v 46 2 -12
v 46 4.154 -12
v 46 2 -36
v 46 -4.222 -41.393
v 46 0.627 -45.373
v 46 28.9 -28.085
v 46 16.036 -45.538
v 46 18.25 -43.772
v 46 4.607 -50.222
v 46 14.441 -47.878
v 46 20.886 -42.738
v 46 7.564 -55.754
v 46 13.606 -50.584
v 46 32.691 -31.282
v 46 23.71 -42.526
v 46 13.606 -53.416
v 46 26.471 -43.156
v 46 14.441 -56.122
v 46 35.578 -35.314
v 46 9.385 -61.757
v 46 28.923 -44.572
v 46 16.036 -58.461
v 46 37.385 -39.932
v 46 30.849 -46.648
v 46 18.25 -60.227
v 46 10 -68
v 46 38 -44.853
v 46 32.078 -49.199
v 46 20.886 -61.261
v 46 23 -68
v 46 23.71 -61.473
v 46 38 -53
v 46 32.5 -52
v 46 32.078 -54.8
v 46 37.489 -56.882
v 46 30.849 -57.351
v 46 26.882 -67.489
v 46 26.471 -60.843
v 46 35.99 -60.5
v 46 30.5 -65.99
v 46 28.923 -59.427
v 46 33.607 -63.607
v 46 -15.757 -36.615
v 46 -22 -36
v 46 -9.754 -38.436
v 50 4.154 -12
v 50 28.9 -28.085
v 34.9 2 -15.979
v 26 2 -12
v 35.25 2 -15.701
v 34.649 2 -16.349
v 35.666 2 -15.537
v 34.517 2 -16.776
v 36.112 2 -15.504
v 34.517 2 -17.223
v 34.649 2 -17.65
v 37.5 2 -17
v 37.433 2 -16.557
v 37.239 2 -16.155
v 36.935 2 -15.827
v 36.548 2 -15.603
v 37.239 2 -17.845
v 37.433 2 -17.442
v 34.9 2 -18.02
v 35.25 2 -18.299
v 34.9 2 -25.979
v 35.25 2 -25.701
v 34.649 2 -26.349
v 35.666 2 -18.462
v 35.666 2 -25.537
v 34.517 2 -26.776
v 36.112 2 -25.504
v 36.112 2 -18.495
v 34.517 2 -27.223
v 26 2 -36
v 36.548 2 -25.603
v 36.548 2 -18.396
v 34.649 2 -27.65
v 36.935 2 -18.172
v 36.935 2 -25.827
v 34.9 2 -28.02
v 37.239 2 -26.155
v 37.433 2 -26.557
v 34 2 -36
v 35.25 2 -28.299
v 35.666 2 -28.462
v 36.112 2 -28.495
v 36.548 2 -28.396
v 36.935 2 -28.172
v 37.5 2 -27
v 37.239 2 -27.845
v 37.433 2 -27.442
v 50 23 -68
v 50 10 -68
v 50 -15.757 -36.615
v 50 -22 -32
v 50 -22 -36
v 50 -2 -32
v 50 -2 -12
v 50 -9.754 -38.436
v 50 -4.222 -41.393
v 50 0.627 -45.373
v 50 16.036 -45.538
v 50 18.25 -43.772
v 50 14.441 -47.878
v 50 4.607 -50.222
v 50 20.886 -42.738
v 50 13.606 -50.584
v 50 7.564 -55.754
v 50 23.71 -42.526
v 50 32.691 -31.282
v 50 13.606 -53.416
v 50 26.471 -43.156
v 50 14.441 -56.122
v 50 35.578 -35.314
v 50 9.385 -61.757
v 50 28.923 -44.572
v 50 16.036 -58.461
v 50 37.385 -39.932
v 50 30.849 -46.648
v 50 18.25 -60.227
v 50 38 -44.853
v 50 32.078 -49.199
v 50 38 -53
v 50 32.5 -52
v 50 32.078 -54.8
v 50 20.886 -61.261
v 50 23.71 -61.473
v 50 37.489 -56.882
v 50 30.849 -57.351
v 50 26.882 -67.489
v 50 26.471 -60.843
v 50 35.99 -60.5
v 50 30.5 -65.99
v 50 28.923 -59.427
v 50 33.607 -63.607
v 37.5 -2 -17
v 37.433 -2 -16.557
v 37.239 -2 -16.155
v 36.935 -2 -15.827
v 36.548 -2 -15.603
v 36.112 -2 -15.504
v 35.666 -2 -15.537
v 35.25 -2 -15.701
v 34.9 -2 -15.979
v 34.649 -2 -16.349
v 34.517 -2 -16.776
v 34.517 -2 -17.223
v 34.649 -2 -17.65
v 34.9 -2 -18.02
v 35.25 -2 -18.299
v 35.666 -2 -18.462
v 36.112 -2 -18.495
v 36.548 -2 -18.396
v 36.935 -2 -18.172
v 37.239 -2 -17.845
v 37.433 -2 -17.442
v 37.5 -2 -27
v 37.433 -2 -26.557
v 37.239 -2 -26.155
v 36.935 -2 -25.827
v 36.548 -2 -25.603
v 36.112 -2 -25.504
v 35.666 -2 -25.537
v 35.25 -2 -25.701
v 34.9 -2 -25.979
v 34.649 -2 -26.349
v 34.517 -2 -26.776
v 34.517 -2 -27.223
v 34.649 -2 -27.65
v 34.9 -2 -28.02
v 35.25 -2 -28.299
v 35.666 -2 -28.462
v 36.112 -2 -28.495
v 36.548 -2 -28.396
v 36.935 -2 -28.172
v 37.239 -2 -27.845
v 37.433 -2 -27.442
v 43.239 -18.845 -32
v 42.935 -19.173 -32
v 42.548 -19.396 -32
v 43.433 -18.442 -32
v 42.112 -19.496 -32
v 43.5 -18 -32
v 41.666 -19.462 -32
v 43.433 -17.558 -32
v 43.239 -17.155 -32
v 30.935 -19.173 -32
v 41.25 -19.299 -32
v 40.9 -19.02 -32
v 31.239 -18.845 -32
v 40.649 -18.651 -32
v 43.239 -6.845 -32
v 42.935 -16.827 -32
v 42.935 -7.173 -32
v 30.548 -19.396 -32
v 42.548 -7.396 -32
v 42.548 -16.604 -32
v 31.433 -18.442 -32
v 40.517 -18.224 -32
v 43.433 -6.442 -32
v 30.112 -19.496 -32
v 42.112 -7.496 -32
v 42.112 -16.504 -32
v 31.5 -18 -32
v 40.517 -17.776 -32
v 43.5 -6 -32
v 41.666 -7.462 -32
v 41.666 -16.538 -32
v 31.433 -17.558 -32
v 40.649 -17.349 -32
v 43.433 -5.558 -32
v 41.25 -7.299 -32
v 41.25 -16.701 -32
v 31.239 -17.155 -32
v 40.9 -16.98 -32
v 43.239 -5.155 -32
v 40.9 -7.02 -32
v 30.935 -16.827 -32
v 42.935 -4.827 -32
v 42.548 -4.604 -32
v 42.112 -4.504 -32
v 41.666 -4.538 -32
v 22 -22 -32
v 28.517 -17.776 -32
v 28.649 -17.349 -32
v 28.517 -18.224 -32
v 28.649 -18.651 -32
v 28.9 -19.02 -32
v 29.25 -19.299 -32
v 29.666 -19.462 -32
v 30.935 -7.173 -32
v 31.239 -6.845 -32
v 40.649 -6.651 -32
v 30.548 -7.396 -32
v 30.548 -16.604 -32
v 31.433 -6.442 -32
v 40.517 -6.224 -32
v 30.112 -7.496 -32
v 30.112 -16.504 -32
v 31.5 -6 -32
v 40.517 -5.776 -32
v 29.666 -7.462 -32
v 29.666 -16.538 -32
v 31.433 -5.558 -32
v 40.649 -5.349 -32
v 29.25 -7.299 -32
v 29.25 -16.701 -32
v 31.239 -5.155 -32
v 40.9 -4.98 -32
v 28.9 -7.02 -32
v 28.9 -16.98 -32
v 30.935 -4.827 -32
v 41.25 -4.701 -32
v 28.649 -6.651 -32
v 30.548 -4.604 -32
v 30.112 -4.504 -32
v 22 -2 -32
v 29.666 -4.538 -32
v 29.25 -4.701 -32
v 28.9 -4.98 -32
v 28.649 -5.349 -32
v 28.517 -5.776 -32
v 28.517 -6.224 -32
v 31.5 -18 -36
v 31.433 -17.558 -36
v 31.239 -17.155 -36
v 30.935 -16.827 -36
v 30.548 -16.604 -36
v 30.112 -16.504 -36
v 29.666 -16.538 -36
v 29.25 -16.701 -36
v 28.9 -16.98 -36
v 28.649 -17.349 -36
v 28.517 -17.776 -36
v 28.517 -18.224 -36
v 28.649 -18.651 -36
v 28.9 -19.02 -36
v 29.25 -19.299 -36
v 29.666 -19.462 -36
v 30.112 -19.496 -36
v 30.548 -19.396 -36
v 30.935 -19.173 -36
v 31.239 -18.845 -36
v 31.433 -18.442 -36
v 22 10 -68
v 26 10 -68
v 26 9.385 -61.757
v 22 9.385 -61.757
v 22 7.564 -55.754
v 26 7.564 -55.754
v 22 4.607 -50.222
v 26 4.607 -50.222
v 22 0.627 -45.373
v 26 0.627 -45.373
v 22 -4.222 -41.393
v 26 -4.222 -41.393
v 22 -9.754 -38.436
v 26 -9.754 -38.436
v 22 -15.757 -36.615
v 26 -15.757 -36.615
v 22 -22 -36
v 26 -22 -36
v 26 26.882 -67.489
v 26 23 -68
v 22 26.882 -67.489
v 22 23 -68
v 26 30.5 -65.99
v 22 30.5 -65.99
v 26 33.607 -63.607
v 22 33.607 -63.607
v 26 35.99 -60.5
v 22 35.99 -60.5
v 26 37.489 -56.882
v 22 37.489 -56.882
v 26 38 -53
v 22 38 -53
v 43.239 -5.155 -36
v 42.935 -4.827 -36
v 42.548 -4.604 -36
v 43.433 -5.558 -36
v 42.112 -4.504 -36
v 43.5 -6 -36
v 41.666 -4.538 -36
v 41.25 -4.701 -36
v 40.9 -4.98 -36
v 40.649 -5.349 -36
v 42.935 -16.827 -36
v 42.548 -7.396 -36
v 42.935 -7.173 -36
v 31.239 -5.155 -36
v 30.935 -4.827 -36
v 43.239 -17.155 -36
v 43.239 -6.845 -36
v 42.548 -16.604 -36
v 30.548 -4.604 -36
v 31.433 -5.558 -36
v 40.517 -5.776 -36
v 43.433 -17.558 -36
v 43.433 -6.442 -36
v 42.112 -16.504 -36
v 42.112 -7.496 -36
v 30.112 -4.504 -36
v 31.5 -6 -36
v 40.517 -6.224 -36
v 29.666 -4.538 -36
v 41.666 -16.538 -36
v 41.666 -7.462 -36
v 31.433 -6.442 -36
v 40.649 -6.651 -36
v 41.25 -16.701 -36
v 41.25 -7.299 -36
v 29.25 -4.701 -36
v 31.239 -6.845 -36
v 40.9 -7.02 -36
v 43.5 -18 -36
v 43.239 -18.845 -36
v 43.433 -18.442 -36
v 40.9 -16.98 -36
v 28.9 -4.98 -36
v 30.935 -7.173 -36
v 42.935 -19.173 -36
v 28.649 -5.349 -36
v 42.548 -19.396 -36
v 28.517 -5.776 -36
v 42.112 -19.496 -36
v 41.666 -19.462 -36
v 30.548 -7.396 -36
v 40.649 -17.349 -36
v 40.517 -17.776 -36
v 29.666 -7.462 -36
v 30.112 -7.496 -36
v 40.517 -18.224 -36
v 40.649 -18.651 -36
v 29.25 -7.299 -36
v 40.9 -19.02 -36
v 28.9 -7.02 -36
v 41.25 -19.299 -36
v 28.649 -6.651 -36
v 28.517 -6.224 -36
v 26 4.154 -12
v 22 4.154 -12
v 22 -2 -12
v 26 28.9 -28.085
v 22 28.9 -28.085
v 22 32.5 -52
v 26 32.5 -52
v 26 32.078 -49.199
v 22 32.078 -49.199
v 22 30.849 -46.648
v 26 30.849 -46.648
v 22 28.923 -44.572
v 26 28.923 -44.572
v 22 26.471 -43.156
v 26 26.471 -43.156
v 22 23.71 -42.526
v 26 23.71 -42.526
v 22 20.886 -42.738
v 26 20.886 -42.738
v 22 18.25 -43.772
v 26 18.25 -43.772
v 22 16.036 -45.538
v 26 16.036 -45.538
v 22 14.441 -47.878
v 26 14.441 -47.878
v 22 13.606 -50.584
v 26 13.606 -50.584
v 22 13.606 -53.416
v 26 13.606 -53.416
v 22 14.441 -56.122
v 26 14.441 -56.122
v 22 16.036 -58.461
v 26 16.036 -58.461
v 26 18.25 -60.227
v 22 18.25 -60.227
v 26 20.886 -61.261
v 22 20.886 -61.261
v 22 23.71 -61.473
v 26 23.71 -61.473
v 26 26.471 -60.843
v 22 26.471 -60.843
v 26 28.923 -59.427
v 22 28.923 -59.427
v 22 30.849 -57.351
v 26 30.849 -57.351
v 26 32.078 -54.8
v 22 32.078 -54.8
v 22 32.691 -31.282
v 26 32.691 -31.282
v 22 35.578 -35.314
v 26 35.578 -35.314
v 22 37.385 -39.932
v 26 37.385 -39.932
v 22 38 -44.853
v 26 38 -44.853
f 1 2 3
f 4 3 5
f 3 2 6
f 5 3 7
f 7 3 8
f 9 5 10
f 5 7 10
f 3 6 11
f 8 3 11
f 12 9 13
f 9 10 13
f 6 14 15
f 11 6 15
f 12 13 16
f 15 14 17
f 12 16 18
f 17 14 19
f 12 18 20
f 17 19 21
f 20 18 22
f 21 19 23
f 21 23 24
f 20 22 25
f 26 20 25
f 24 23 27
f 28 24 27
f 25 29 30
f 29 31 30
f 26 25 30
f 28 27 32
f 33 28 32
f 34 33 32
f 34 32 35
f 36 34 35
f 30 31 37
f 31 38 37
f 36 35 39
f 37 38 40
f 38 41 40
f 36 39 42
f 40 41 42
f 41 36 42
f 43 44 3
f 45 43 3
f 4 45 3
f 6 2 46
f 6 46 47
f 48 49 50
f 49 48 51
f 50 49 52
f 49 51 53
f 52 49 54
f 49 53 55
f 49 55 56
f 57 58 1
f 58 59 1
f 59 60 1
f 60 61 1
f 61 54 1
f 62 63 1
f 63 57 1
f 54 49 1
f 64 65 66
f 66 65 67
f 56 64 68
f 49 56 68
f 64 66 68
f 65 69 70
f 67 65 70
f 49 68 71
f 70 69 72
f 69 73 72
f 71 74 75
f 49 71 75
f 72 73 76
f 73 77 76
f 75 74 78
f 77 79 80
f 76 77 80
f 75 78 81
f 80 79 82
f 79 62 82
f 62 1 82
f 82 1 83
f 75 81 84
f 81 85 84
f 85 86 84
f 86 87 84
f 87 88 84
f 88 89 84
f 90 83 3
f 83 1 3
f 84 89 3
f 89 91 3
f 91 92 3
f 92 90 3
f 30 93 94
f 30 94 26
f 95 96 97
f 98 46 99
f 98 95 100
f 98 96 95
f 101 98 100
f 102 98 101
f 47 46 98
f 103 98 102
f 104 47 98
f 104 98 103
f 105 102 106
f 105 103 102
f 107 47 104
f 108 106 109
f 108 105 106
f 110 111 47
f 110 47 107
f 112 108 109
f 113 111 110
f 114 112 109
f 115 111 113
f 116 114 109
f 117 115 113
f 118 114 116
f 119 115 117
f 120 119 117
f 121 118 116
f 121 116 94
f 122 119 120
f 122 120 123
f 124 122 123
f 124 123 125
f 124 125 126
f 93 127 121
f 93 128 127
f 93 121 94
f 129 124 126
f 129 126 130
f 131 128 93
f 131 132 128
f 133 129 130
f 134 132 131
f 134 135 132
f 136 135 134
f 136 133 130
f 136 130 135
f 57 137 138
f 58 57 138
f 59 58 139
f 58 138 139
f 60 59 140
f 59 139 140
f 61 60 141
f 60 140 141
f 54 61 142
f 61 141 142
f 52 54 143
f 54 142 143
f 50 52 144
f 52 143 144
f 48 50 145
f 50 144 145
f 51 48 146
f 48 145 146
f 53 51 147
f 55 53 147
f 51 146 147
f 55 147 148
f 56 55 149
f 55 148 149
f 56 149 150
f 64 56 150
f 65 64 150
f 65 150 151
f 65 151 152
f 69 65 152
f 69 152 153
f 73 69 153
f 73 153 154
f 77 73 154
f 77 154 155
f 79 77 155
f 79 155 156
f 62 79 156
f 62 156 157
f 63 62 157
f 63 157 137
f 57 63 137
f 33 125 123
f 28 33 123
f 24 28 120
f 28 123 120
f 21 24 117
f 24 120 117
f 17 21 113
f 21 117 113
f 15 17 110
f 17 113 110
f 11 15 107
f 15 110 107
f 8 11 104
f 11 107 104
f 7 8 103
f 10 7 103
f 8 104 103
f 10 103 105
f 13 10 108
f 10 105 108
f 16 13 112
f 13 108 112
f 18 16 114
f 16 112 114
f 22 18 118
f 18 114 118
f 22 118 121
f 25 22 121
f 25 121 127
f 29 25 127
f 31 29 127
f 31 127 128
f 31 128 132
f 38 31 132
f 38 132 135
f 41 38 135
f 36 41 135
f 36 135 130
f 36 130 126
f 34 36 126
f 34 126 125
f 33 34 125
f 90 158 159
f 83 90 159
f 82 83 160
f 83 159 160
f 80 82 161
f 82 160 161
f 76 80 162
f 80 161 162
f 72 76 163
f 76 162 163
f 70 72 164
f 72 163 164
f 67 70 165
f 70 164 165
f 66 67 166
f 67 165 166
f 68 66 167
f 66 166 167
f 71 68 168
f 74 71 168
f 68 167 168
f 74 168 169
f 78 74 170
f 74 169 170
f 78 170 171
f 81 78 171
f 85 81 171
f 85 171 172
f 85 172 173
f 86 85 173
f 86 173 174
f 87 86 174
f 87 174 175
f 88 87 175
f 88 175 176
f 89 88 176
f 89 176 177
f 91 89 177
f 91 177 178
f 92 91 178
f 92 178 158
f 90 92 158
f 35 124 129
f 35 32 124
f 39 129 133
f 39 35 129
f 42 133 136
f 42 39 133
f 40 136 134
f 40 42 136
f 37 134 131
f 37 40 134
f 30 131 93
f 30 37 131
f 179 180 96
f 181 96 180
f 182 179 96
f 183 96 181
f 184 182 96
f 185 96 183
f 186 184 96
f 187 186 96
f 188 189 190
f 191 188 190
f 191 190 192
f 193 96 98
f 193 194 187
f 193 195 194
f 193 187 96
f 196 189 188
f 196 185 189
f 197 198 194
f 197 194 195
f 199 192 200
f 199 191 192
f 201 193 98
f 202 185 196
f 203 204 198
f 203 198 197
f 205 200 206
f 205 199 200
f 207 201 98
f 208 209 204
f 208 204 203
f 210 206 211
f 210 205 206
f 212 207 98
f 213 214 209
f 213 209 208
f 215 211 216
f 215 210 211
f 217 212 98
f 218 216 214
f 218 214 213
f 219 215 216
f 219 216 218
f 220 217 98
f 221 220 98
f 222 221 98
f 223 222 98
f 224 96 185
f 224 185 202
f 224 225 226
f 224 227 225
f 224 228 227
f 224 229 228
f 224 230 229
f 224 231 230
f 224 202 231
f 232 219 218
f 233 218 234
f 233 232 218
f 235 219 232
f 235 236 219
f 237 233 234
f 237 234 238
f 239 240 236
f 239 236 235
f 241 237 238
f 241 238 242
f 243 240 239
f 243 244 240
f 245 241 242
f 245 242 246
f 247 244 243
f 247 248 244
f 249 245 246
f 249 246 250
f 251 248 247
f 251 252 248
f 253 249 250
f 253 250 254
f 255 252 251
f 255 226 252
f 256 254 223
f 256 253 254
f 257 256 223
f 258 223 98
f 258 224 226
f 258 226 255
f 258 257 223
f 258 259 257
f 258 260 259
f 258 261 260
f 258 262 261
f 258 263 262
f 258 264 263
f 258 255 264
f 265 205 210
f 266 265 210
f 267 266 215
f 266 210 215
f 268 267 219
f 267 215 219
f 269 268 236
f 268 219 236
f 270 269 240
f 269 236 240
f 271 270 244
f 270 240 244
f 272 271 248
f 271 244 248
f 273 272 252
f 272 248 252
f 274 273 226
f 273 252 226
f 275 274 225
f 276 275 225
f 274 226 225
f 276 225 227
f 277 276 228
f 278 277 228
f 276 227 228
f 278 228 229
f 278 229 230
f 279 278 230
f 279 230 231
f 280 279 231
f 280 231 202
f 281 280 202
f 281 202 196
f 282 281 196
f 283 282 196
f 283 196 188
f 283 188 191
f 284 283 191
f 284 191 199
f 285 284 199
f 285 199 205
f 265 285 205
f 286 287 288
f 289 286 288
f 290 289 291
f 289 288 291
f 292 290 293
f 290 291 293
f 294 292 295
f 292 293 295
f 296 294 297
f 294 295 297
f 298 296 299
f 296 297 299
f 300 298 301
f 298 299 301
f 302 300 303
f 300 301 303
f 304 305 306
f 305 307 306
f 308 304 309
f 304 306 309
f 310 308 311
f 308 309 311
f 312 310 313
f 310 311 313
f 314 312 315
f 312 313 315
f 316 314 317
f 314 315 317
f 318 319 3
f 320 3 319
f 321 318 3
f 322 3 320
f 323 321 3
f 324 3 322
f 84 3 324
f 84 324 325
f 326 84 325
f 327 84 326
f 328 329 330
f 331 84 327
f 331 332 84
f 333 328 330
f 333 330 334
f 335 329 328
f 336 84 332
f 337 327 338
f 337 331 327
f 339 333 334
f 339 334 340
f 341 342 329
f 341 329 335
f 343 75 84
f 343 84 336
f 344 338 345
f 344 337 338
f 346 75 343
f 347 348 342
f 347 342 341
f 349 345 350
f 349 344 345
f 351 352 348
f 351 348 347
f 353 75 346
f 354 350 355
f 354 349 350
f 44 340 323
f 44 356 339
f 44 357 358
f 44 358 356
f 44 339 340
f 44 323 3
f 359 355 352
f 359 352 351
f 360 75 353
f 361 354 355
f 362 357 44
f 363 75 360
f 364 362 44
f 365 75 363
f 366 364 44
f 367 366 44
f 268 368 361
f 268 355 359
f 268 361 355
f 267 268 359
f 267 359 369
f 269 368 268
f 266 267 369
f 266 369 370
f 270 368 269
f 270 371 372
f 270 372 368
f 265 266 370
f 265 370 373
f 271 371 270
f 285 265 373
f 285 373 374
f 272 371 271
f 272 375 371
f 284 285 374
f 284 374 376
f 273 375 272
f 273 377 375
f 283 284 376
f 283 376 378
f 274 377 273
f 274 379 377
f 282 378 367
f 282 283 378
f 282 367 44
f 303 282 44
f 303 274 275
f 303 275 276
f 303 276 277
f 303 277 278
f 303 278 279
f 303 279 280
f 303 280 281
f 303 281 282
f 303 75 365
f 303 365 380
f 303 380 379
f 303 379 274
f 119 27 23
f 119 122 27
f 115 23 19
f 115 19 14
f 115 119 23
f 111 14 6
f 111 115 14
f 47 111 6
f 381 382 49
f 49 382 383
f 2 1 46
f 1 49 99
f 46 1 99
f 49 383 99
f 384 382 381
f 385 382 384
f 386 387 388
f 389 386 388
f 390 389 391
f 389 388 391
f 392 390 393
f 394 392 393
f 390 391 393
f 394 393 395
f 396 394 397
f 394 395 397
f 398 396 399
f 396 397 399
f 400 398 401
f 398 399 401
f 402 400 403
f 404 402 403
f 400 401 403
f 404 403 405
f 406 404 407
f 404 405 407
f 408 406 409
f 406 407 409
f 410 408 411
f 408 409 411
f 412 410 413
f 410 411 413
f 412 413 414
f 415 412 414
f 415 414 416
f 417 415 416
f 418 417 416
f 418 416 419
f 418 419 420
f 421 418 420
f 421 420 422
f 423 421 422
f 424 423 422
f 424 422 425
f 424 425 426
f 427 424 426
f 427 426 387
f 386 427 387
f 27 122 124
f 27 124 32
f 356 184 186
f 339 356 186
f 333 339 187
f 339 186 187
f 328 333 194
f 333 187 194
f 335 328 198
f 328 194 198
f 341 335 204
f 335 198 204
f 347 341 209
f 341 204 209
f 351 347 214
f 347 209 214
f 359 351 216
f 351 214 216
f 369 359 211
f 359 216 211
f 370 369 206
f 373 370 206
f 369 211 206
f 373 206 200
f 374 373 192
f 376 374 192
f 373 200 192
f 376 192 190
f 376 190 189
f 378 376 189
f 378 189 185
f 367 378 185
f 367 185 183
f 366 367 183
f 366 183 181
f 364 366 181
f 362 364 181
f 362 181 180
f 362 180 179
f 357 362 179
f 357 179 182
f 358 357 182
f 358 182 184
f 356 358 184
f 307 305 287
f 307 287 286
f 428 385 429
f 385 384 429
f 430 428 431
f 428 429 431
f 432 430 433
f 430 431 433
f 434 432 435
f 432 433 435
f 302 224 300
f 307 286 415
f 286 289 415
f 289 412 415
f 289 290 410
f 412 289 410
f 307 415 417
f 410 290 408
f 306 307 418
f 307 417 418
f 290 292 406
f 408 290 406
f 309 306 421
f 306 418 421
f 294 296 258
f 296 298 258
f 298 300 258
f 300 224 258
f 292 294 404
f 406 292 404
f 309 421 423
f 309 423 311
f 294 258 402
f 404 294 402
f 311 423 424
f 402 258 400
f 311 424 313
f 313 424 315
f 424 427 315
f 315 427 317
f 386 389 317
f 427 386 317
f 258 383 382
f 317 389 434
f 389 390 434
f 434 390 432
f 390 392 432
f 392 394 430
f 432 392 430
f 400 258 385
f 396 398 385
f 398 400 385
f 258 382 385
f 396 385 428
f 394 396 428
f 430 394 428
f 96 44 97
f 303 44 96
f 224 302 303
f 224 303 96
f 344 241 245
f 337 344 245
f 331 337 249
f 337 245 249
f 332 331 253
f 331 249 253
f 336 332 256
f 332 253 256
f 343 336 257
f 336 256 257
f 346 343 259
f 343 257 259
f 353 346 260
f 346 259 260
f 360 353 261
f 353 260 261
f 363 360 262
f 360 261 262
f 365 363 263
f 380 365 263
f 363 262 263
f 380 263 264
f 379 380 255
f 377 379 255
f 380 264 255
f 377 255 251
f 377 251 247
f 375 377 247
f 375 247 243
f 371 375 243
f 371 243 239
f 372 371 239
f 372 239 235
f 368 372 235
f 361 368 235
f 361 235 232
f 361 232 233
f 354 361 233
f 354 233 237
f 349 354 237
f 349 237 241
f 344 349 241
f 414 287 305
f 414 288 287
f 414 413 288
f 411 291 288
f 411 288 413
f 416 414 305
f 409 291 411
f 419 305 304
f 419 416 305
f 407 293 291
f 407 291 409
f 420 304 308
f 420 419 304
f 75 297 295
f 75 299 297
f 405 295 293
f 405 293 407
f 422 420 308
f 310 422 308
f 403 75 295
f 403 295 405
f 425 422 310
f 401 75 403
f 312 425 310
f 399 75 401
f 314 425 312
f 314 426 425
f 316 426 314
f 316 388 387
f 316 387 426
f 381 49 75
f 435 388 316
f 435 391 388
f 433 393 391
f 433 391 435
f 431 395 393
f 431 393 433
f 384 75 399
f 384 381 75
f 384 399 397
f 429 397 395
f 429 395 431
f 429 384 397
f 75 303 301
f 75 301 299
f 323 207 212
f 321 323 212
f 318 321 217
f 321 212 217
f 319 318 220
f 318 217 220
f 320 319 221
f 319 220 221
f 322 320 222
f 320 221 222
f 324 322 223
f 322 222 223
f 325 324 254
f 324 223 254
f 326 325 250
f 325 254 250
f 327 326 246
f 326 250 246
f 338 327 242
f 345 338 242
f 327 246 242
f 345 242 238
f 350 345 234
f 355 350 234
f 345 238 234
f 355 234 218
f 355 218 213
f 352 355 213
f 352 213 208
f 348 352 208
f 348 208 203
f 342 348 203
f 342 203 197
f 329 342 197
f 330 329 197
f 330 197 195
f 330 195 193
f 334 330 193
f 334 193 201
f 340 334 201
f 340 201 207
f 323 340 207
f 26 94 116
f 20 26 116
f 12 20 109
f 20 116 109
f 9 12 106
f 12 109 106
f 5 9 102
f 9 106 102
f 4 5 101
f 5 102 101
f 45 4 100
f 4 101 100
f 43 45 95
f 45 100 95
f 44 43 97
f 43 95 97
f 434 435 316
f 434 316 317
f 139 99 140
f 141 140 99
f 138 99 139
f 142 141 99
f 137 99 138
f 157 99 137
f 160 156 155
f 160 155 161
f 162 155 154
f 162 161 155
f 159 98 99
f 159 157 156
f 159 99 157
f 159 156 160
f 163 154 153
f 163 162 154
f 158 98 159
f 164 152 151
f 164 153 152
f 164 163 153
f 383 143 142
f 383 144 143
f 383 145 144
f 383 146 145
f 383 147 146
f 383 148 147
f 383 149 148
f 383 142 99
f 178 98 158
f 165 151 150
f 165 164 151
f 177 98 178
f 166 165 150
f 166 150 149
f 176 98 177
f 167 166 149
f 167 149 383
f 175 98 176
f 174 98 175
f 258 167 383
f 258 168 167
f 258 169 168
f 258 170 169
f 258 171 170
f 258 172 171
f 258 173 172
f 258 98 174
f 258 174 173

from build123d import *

# Parameters (mm, degrees)
EXTRUDE_1_DEPTH      = 40
SKETCH_2_R           = 9.5
CUT_EXTRUDE_1_DEPTH  = 59.685603004
FILLET_1_R           = 10
SKETCH_5_R           = 1.5
CUT_EXTRUDE_4_DEPTH  = 59.685603004
CUT_EXTRUDE_START    = -1.5
SKETCH_6_R           = 10.5
SKETCH_6_R_2         = 9.5
CUT_EXTRUDE_5_DEPTH  = 1.5
SKETCH_7_W           = 51.462210428
SKETCH_7_H           = 48.175392078
CUT_EXTRUDE_6_DEPTH  = 47
FILLET_2_R           = 10
SKETCH_11_R          = 11.25
SKETCH_11_R_2        = 10.5
EXTRUDE_3_DEPTH      = 1.5
SKETCH_12_R          = 11.25
SKETCH_12_R_2        = 10.5
EXTRUDE_4_DEPTH      = 0.7
SKETCH_13_R          = 10.5
SKETCH_13_R_2        = 9.5
CUT_EXTRUDE_8_DEPTH  = 1
SKETCH_15_R          = 10.5
SKETCH_15_R_2        = 9.5
EXTRUDE_5_DEPTH      = 0.5
SKETCH_17_W          = 12
SKETCH_17_H          = 36.000381057
EXTRUDE_6_DEPTH      = 2
SKETCH_18_W          = 20
SKETCH_18_H          = 36.000381057
CUT_EXTRUDE_9_DEPTH  = 2
SKETCH_19_R          = 1.5
EXTRUDE_7_DEPTH      = 4
EXTRUDE_START        = -4
SKETCH_20_R          = 1.5
EXTRUDE_8_DEPTH      = 4
EXTRUDE_9_DEPTH      = 44
SKETCH_22_W          = 64.499046495
SKETCH_22_H          = 49.763793388
CUT_EXTRUDE_10_DEPTH = 38
SKETCH_23_W          = 12
SKETCH_23_H          = 34.000142893
CUT_EXTRUDE_12_DEPTH = 38
SKETCH_24_W          = 23.945420323
SKETCH_24_H          = 48.426166837
CUT_EXTRUDE_13_DEPTH = 4
SKETCH_25_W          = 20
SKETCH_25_H          = 40
CUT_EXTRUDE_14_DEPTH = 4
EXTRUDE_10_DEPTH     = 4
EXTRUDE_11_DEPTH     = 4
SKETCH_30_R          = 10.5
SKETCH_30_R_2        = 7.5
EXTRUDE_12_DEPTH     = 4
SKETCH_31_R          = 10.5
SKETCH_31_R_2        = 9.5
EXTRUDE_13_DEPTH     = 1
SKETCH_32_R          = 8.25
SKETCH_32_R_2        = 7.5
CUT_EXTRUDE_15_DEPTH = 0.8
SKETCH_34_W          = 20
SKETCH_34_H          = 4
EXTRUDE_14_DEPTH     = 20
SKETCH_37_R          = 9.5
CUT_EXTRUDE_19_DEPTH = 10
SKETCH_38_R          = 10.5
CUT_EXTRUDE_20_DEPTH = 1
SKETCH_39_W          = 4
SKETCH_39_H          = 36
EXTRUDE_15_DEPTH     = 22
SKETCH_40_R          = 9.5
CUT_EXTRUDE_21_DEPTH = 22
SKETCH_41_R          = 9.5
EXTRUDE_16_DEPTH     = 4
SKETCH_44_R          = 10.5
EXTRUDE_17_DEPTH     = 4
EXTRUDE_START_2      = 8
SKETCH_45_R          = 9.5
EXTRUDE_18_DEPTH     = 8
CUT_EXTRUDE_22_DEPTH = 8
SKETCH_50_W          = 4
SKETCH_50_H          = 36
EXTRUDE_19_DEPTH     = 2
EXTRUDE_20_DEPTH     = 4
EXTRUDE_21_DEPTH     = 4
SKETCH_55_R          = 1.5
CUT_EXTRUDE_23_DEPTH = 30
CUT_EXTRUDE_24_DEPTH = 30
FILLET_4_R           = 20
SKETCH_58_W          = 28
SKETCH_58_H          = 20
CUT_EXTRUDE_25_DEPTH = 10
SKETCH_59_W          = 28
SKETCH_59_H          = 4
CUT_EXTRUDE_26_DEPTH = 10
SKETCH_60_R          = 1.5
CUT_EXTRUDE_27_DEPTH = 10
SKETCH_61_R          = 9.5
EXTRUDE_22_DEPTH     = 4
SKETCH_62_R          = 9.5
EXTRUDE_23_DEPTH     = 4
SKETCH_64_W          = 4
SKETCH_64_H          = 36
EXTRUDE_24_DEPTH     = 8
SKETCH_65_R          = 32
CUT_EXTRUDE_28_DEPTH = 39
SKETCH_66_R          = 9.5
CUT_EXTRUDE_29_DEPTH = 41
FILLET_5_R           = 15


with BuildPart() as part:
    # 草图1 → 凸台-拉伸1 (new, symmetric)
    with BuildSketch(Plane.XY):
        Polygon((30, -4), (30, 38), (34, 38), (34, 0), (46, 0), (46, 38), (50, 38), (50, -4), align=None)
    extrude(amount=EXTRUDE_1_DEPTH, both=True)

    # 草图2 → 切除-拉伸1 (cut, through all)
    with BuildSketch(Plane(origin=(50, 0, 0), x_dir=(0, 0, -1), z_dir=(1, 0, 0))):
        with Locations(Location((22, 22, 0), (0, 0, 90))):
            Circle(SKETCH_2_R)
        with Locations(Location((-22, 22, 0), (0, 0, 270))):
            Circle(SKETCH_2_R)
    extrude(amount=-CUT_EXTRUDE_1_DEPTH, mode=Mode.SUBTRACT)

    # 圆角1
    fillet_1_edges = [part.edges().sort_by_distance(p)[0] for p in [
        (32, 38, -40),
        (48, 38, 40),
        (32, 38, 40),
        (48, 38, -40),
    ]]
    fillet(fillet_1_edges, radius=FILLET_1_R)

    # 草图5 → 切除-拉伸4 (cut, through all)
    with BuildSketch(Plane(origin=(50, 0, 0), x_dir=(0, 0, -1), z_dir=(1, 0, 0))):
        with Locations(Location((34.990381057, 29.5, 0), (0, 0, 90))):
            Circle(SKETCH_5_R)
        with Locations(Location((22, 7, 0), (0, 0, 90))):
            Circle(SKETCH_5_R)
        with Locations(Location((9.009618943, 29.5, 0), (0, 0, 90))):
            Circle(SKETCH_5_R)
        with Locations(Location((-34.990381057, 29.5, 0), (0, 0, 270))):
            Circle(SKETCH_5_R)
        with Locations(Location((-22, 7, 0), (0, 0, 270))):
            Circle(SKETCH_5_R)
        with Locations(Location((-9.009618943, 29.5, 0), (0, 0, 270))):
            Circle(SKETCH_5_R)
    extrude(amount=-CUT_EXTRUDE_4_DEPTH, mode=Mode.SUBTRACT)

    # 草图6 → 切除-拉伸5 (cut)
    # profile 1 of 2: a face of its own
    with BuildSketch(Plane.ZY.offset(-30).offset(CUT_EXTRUDE_START)):
        with Locations((-22, 22)):
            Circle(SKETCH_6_R)
        with Locations((-22, 22)):
            Circle(SKETCH_6_R_2, mode=Mode.SUBTRACT)
    # profile 2 of 2: a face of its own
    with BuildSketch(Plane.ZY.offset(-30).offset(CUT_EXTRUDE_START)):
        with Locations((22, 22)):
            Circle(SKETCH_6_R)
        with Locations((22, 22)):
            Circle(SKETCH_6_R_2, mode=Mode.SUBTRACT)
    extrude(amount=CUT_EXTRUDE_5_DEPTH, mode=Mode.SUBTRACT)

    # 草图7 → 切除-拉伸6 (cut)
    with BuildSketch(Plane(origin=(50, 0, 0), x_dir=(0, 0, -1), z_dir=(1, 0, 0))):
        with Locations((-21.731486271, 13.912303961)):
            Rectangle(SKETCH_7_W, SKETCH_7_H)
    extrude(amount=-CUT_EXTRUDE_6_DEPTH, mode=Mode.SUBTRACT)

    # 圆角2
    fillet_2_edges = [part.edges().sort_by_distance(p)[0] for p in [
        (32, 38, -3.999618943),
        (48, 38, -3.999618943),
    ]]
    fillet(fillet_2_edges, radius=FILLET_2_R)

    # 草图11 → 凸台-拉伸3 (add)
    with BuildSketch(Plane.ZY.offset(-31.5)):
        with Locations((-22, 22)):
            Circle(SKETCH_11_R)
        with Locations((-22, 22)):
            Circle(SKETCH_11_R_2, mode=Mode.SUBTRACT)
    extrude(amount=EXTRUDE_3_DEPTH)

    # 草图12 → 凸台-拉伸4 (add)
    with BuildSketch(Plane.ZY.offset(-31.5)):
        with Locations((-22, 22)):
            Circle(SKETCH_12_R)
        with Locations((-22, 22)):
            Circle(SKETCH_12_R_2, mode=Mode.SUBTRACT)
    extrude(amount=EXTRUDE_4_DEPTH)

    # 草图13 → 切除-拉伸8 (cut)
    with BuildSketch(Plane(origin=(50, 0, 0), x_dir=(0, 0, -1), z_dir=(1, 0, 0))):
        with Locations(Location((22, 22, 0), (0, 0, 180))):
            Circle(SKETCH_13_R)
        with Locations(Location((22, 22, 0), (0, 0, 90))):
            Circle(SKETCH_13_R_2, mode=Mode.SUBTRACT)
    extrude(amount=-CUT_EXTRUDE_8_DEPTH, mode=Mode.SUBTRACT)

    # 草图15 → 凸台-拉伸5 (add)
    with BuildSketch(Plane.ZY.offset(-31.5)):
        with Locations((-22, 22)):
            Circle(SKETCH_15_R)
        with Locations(Location((-22, 22, 0), (0, 0, 90))):
            Circle(SKETCH_15_R_2, mode=Mode.SUBTRACT)
    extrude(amount=EXTRUDE_5_DEPTH)

    # 草图17 → 凸台-拉伸6 (add)
    with BuildSketch(Plane(origin=(0, 0, 0), x_dir=(1, 0, 0), z_dir=(0, 1, 0))):
        with Locations((40, 21.999809472)):
            Rectangle(SKETCH_17_W, SKETCH_17_H)
    extrude(amount=EXTRUDE_6_DEPTH)

    # 草图18 → 切除-拉伸9 (cut)
    with BuildSketch(Plane.XZ.offset(4)):
        with Locations((40, -21.999809472)):
            Rectangle(SKETCH_18_W, SKETCH_18_H)
    extrude(amount=-CUT_EXTRUDE_9_DEPTH, mode=Mode.SUBTRACT)

    # 草图19 → 凸台-拉伸7 (add)
    with BuildSketch(Plane(origin=(50, 0, 0), x_dir=(0, 0, -1), z_dir=(1, 0, 0))):
        with Locations(Location((34.990381057, 29.5, 0), (0, 0, 90))):
            Circle(SKETCH_19_R)
        with Locations(Location((9.009618943, 29.5, 0), (0, 0, 90))):
            Circle(SKETCH_19_R)
        with Locations(Location((22, 7, 0), (0, 0, 90))):
            Circle(SKETCH_19_R)
    extrude(amount=-EXTRUDE_7_DEPTH)

    # 草图20 → 凸台-拉伸8 (add)
    with BuildSketch(Plane.ZY.offset(-30).offset(EXTRUDE_START)):
        with Locations((-9.009618943, 29.5)):
            Circle(SKETCH_20_R)
        with Locations((-22, 7)):
            Circle(SKETCH_20_R)
        with Locations((-34.990381057, 29.5)):
            Circle(SKETCH_20_R)
    extrude(amount=EXTRUDE_8_DEPTH)

    # 草图21 → 凸台-拉伸9 (add)
    with BuildSketch(Plane.ZY.offset(-30)):
        with BuildLine():
            Line((-40, -2), (-35.999809472, -2))
            Line((-35.999809472, -2), (-35.999809472, 36.000142893))
            ThreePointArc((-35.999809472, 36.000142893), (-38.944218656, 32.472242462), (-40, 28))
            Line((-40, 28), (-40, -2))
        make_face()
        with BuildLine():
            Line((-7.999809472, 36.000142893), (-7.999809472, -2))
            Line((-7.999809472, -2), (-3.999618943, -2))
            Line((-3.999618943, -2), (-3.999618943, 28))
            ThreePointArc((-3.999618943, 28), (-5.055400288, 32.472242462), (-7.999809472, 36.000142893))
        make_face()
    extrude(amount=-EXTRUDE_9_DEPTH)

    # 草图22 → 切除-拉伸10 (cut)
    with BuildSketch(Plane(origin=(50, 0, 0), x_dir=(0, 0, -1), z_dir=(1, 0, 0))):
        with Locations((27.945354193, 20.62989223)):
            Rectangle(SKETCH_22_W, SKETCH_22_H)
    extrude(amount=CUT_EXTRUDE_10_DEPTH, mode=Mode.SUBTRACT)

    # 草图23 → 切除-拉伸12 (cut)
    with BuildSketch(Plane.XY.offset(-3.999618943)):
        with Locations((40, 19.000071447)):
            Rectangle(SKETCH_23_W, SKETCH_23_H)
    extrude(amount=-CUT_EXTRUDE_12_DEPTH, mode=Mode.SUBTRACT)

    # 草图24 → 切除-拉伸13 (cut)
    with BuildSketch(Plane.XY.offset(-3.999618943)):
        with Locations((41.972710162, 22.213083419)):
            Rectangle(SKETCH_24_W, SKETCH_24_H)
    extrude(amount=-CUT_EXTRUDE_13_DEPTH, mode=Mode.SUBTRACT)

    # 草图25 → 切除-拉伸14 (cut)
    with BuildSketch(Plane(origin=(0, 0, -40), x_dir=(-1, 0, 0), z_dir=(0, 0, -1))):
        with Locations((-40, 18)):
            Rectangle(SKETCH_25_W, SKETCH_25_H)
    extrude(amount=-CUT_EXTRUDE_14_DEPTH, mode=Mode.SUBTRACT)

    # 草图26 → 凸台-拉伸10 (add)
    with BuildSketch(Plane(origin=(50, 0, 0), x_dir=(0, 0, -1), z_dir=(1, 0, 0))):
        with BuildLine():
            Line((13.999618943, 38), (7.999618943, 38))
            Line((7.999618943, 38), (7.999618943, 36))
            ThreePointArc((7.999618943, 36), (10.837341283, 37.486832981), (13.999618943, 38))
        make_face()
        with BuildLine():
            Line((30, 38), (36, 38))
            Line((36, 38), (36, 36))
            ThreePointArc((36, 36), (33.16227766, 37.486832981), (30, 38))
        make_face()
    extrude(amount=-EXTRUDE_10_DEPTH)

    # 草图27 → 凸台-拉伸11 (add)
    with BuildSketch(Plane.ZY.offset(-30)):
        with BuildLine():
            Line((-7.999618943, 38), (-13.999618943, 38))
            ThreePointArc((-13.999618943, 38), (-10.837341283, 37.486832981), (-7.999618943, 36))
            Line((-7.999618943, 36), (-7.999618943, 38))
        make_face()
        with BuildLine():
            Line((-36, 38), (-30, 38))
            ThreePointArc((-30, 38), (-33.16227766, 37.486832981), (-36, 36))
            Line((-36, 36), (-36, 38))
        make_face()
    extrude(amount=-EXTRUDE_11_DEPTH)

    # 草图30 → 凸台-拉伸12 (add)
    with BuildSketch(Plane(origin=(50, 0, 0), x_dir=(0, 0, -1), z_dir=(1, 0, 0))):
        with Locations(Location((22, 22, 0), (0, 0, 180))):
            Circle(SKETCH_30_R)
        with Locations(Location((22, 22, 0), (0, 0, 90))):
            Circle(SKETCH_30_R_2, mode=Mode.SUBTRACT)
    extrude(amount=-EXTRUDE_12_DEPTH)

    # 草图31 → 凸台-拉伸13 (add)
    with BuildSketch(Plane.ZY.offset(-31)):
        with Locations((-22, 22)):
            Circle(SKETCH_31_R)
        with Locations((-22, 22)):
            Circle(SKETCH_31_R_2, mode=Mode.SUBTRACT)
    extrude(amount=EXTRUDE_13_DEPTH)

    # 草图32 → 切除-拉伸15 (cut)
    with BuildSketch(Plane(origin=(50, 0, 0), x_dir=(0, 0, -1), z_dir=(1, 0, 0))):
        with Locations(Location((22, 22, 0), (0, 0, 90))):
            Circle(SKETCH_32_R)
        with Locations(Location((22, 22, 0), (0, 0, 90))):
            Circle(SKETCH_32_R_2, mode=Mode.SUBTRACT)
    extrude(amount=-CUT_EXTRUDE_15_DEPTH, mode=Mode.SUBTRACT)

    # 草图34 → 凸台-拉伸14 (add)
    with BuildSketch(Plane.XZ.offset(2)):
        with Locations((40, -9.999618943)):
            Rectangle(SKETCH_34_W, SKETCH_34_H)
        with Locations((40, -34)):
            Rectangle(SKETCH_34_W, SKETCH_34_H)
    extrude(amount=EXTRUDE_14_DEPTH)

    # 草图37 → 切除-拉伸19 (cut)
    with BuildSketch(Plane(origin=(50, 0, 0), x_dir=(0, 0, -1), z_dir=(1, 0, 0))):
        with Locations(Location((22, 22, 0), (0, 0, 180))):
            Circle(SKETCH_37_R)
    extrude(amount=-CUT_EXTRUDE_19_DEPTH, mode=Mode.SUBTRACT)

    # 草图38 → 切除-拉伸20 (cut)
    with BuildSketch(Plane(origin=(50, 0, 0), x_dir=(0, 0, -1), z_dir=(1, 0, 0))):
        with Locations(Location((22, 22, 0), (0, 0, 90))):
            Circle(SKETCH_38_R)
    extrude(amount=-CUT_EXTRUDE_20_DEPTH, mode=Mode.SUBTRACT)

    # 草图39 → 凸台-拉伸15 (add)
    with BuildSketch(Plane(origin=(0, 0, -36), x_dir=(-1, 0, 0), z_dir=(0, 0, -1))):
        with Locations((-48, 20)):
            Rectangle(SKETCH_39_W, SKETCH_39_H)
        with Locations((-32, 20)):
            Rectangle(SKETCH_39_W, SKETCH_39_H)
    extrude(amount=EXTRUDE_15_DEPTH)

    # 草图40 → 切除-拉伸21 (cut)
    with BuildSketch(Plane.ZY.offset(-30)):
        with Locations((-44, 22)):
            Circle(SKETCH_40_R)
    extrude(amount=-CUT_EXTRUDE_21_DEPTH, mode=Mode.SUBTRACT)

    # 草图41 → 凸台-拉伸16 (add)
    with BuildSketch(Plane.ZY.offset(-30).offset(EXTRUDE_START)):
        with Locations(Location((-22, 22, 0), (0, 0, 90))):
            Circle(SKETCH_41_R)
    extrude(amount=EXTRUDE_16_DEPTH)

    # 草图44 → 凸台-拉伸17 (add)
    with BuildSketch(Plane(origin=(50, 0, 0), x_dir=(0, 0, -1), z_dir=(1, 0, 0))):
        with Locations((22, 22)):
            Circle(SKETCH_44_R)
    extrude(amount=-EXTRUDE_17_DEPTH)

    # 草图45 → 凸台-拉伸18 (add)
    with BuildSketch(Plane.ZY.offset(-30).offset(EXTRUDE_START_2)):
        Polygon((-7.999618943, 38), (-58, 38), (-58, 2), (-36, 2), (-36, -22), (-32, -22), (-32, -2), (-11.999618943, -2), (-11.999618943, -22), (-7.999618943, -22), align=None)
        with Locations((-44, 22)):
            Circle(SKETCH_45_R, mode=Mode.SUBTRACT)
    extrude(amount=-EXTRUDE_18_DEPTH)

    # 草图46 → 切除-拉伸22 (cut)
    with BuildSketch(Plane(origin=(34, 0, 0), x_dir=(0, 0, -1), z_dir=(1, 0, 0))):
        Polygon((7.999618943, 2), (36, 2), (58, 2), (58, 38), (7.999618943, 38), align=None)
    extrude(amount=-CUT_EXTRUDE_22_DEPTH, mode=Mode.SUBTRACT)

    # 草图50 → 凸台-拉伸19 (add)
    with BuildSketch(Plane(origin=(0, 0, -58), x_dir=(-1, 0, 0), z_dir=(0, 0, -1))):
        with Locations((-48, 20)):
            Rectangle(SKETCH_50_W, SKETCH_50_H)
        with Locations((-24, 20)):
            Rectangle(SKETCH_50_W, SKETCH_50_H)
    extrude(amount=EXTRUDE_19_DEPTH)

    # 草图51 → 凸台-拉伸20 (add)
    with BuildSketch(Plane.ZY.offset(-22)):
        with BuildLine():
            Line((-60, 2), (-36, 2))
            Line((-36, 2), (-36, -22))
            ThreePointArc((-36, -22), (-43.029437252, -5.029437252), (-60, 2))
        make_face()
    extrude(amount=-EXTRUDE_20_DEPTH)

    # 草图54 → 凸台-拉伸21 (add)
    with BuildSketch(Plane(origin=(50, 0, 0), x_dir=(0, 0, -1), z_dir=(1, 0, 0)).offset(EXTRUDE_START)):
        with BuildLine():
            Line((36, 2), (36, -22))
            ThreePointArc((36, -22), (43.029437252, -5.029437252), (60, 2))
            Line((60, 2), (36, 2))
        make_face()
    extrude(amount=EXTRUDE_21_DEPTH)

    # 草图55 → 切除-拉伸23 (cut)
    with BuildSketch(Plane.XY.offset(-7.999618943)):
        with Locations((30, -6)):
            Circle(SKETCH_55_R)
        with Locations((42, -6)):
            Circle(SKETCH_55_R)
        with Locations((42, -18)):
            Circle(SKETCH_55_R)
        with Locations((30, -18)):
            Circle(SKETCH_55_R)
    extrude(amount=-CUT_EXTRUDE_23_DEPTH, mode=Mode.SUBTRACT)

    # 草图57 → 切除-拉伸24 (cut)
    with BuildSketch(Plane.ZY.offset(-22)):
        Polygon((-7.999618943, -2), (-33.999809472, 38), (-7.999618943, 38), align=None)
    extrude(amount=-CUT_EXTRUDE_24_DEPTH, mode=Mode.SUBTRACT)

    # 圆角4
    fillet_4_edges = [part.edges().sort_by_distance(p)[0] for p in [
        (48, 38, -33.999809472),
        (24, 38, -33.999809472),
    ]]
    fillet(fillet_4_edges, radius=FILLET_4_R)

    # 草图58 → 切除-拉伸25 (cut)
    with BuildSketch(Plane(origin=(0, 0, -11.999618943), x_dir=(-1, 0, 0), z_dir=(0, 0, -1))):
        with Locations((-36, -12)):
            Rectangle(SKETCH_58_W, SKETCH_58_H)
    extrude(amount=-CUT_EXTRUDE_25_DEPTH, mode=Mode.SUBTRACT)

    # 草图59 → 切除-拉伸26 (cut)
    with BuildSketch(Plane.XZ.offset(2)):
        with Locations((36, -9.999618943)):
            Rectangle(SKETCH_59_W, SKETCH_59_H)
    extrude(amount=-CUT_EXTRUDE_26_DEPTH, mode=Mode.SUBTRACT)

    # 草图60 → 切除-拉伸27 (cut)
    with BuildSketch(Plane.XZ.offset(2)):
        with Locations((36, -16.999618943)):
            Circle(SKETCH_60_R)
        with Locations((36, -26.999618943)):
            Circle(SKETCH_60_R)
    extrude(amount=-CUT_EXTRUDE_27_DEPTH, mode=Mode.SUBTRACT)

    # 草图61 → 凸台-拉伸22 (add)
    with BuildSketch(Plane.ZY.offset(-22)):
        with Locations(Location((-44, 22, 0), (0, 0, 270))):
            Circle(SKETCH_61_R)
    extrude(amount=-EXTRUDE_22_DEPTH)

    # 草图62 → 凸台-拉伸23 (add)
    with BuildSketch(Plane(origin=(50, 0, 0), x_dir=(0, 0, -1), z_dir=(1, 0, 0)).offset(EXTRUDE_START)):
        with Locations((44, 22)):
            Circle(SKETCH_62_R)
    extrude(amount=EXTRUDE_23_DEPTH)

    # 草图64 → 凸台-拉伸24 (add)
    with BuildSketch(Plane(origin=(0, 0, -60), x_dir=(-1, 0, 0), z_dir=(0, 0, -1))):
        with Locations((-24, 20)):
            Rectangle(SKETCH_64_W, SKETCH_64_H)
        with Locations((-48, 20)):
            Rectangle(SKETCH_64_W, SKETCH_64_H)
    extrude(amount=EXTRUDE_24_DEPTH)

    # 草图65 → 切除-拉伸28 (cut)
    with BuildSketch(Plane(origin=(50, 0, 0), x_dir=(0, 0, -1), z_dir=(1, 0, 0))):
        with Locations((68, -22)):
            Circle(SKETCH_65_R)
    extrude(amount=-CUT_EXTRUDE_28_DEPTH, mode=Mode.SUBTRACT)

    # 草图66 → 切除-拉伸29 (cut)
    with BuildSketch(Plane(origin=(50, 0, 0), x_dir=(0, 0, -1), z_dir=(1, 0, 0))):
        with Locations(Location((51.999618943, 23, 0), (0, 0, 90))):
            Circle(SKETCH_66_R)
    extrude(amount=-CUT_EXTRUDE_29_DEPTH, mode=Mode.SUBTRACT)

    # 圆角5
    fillet_5_edges = [part.edges().sort_by_distance(p)[0] for p in [
        (24, 38, -68),
        (48, 38, -68),
    ]]
    fillet(fillet_5_edges, radius=FILLET_5_R)


solid = part.part
